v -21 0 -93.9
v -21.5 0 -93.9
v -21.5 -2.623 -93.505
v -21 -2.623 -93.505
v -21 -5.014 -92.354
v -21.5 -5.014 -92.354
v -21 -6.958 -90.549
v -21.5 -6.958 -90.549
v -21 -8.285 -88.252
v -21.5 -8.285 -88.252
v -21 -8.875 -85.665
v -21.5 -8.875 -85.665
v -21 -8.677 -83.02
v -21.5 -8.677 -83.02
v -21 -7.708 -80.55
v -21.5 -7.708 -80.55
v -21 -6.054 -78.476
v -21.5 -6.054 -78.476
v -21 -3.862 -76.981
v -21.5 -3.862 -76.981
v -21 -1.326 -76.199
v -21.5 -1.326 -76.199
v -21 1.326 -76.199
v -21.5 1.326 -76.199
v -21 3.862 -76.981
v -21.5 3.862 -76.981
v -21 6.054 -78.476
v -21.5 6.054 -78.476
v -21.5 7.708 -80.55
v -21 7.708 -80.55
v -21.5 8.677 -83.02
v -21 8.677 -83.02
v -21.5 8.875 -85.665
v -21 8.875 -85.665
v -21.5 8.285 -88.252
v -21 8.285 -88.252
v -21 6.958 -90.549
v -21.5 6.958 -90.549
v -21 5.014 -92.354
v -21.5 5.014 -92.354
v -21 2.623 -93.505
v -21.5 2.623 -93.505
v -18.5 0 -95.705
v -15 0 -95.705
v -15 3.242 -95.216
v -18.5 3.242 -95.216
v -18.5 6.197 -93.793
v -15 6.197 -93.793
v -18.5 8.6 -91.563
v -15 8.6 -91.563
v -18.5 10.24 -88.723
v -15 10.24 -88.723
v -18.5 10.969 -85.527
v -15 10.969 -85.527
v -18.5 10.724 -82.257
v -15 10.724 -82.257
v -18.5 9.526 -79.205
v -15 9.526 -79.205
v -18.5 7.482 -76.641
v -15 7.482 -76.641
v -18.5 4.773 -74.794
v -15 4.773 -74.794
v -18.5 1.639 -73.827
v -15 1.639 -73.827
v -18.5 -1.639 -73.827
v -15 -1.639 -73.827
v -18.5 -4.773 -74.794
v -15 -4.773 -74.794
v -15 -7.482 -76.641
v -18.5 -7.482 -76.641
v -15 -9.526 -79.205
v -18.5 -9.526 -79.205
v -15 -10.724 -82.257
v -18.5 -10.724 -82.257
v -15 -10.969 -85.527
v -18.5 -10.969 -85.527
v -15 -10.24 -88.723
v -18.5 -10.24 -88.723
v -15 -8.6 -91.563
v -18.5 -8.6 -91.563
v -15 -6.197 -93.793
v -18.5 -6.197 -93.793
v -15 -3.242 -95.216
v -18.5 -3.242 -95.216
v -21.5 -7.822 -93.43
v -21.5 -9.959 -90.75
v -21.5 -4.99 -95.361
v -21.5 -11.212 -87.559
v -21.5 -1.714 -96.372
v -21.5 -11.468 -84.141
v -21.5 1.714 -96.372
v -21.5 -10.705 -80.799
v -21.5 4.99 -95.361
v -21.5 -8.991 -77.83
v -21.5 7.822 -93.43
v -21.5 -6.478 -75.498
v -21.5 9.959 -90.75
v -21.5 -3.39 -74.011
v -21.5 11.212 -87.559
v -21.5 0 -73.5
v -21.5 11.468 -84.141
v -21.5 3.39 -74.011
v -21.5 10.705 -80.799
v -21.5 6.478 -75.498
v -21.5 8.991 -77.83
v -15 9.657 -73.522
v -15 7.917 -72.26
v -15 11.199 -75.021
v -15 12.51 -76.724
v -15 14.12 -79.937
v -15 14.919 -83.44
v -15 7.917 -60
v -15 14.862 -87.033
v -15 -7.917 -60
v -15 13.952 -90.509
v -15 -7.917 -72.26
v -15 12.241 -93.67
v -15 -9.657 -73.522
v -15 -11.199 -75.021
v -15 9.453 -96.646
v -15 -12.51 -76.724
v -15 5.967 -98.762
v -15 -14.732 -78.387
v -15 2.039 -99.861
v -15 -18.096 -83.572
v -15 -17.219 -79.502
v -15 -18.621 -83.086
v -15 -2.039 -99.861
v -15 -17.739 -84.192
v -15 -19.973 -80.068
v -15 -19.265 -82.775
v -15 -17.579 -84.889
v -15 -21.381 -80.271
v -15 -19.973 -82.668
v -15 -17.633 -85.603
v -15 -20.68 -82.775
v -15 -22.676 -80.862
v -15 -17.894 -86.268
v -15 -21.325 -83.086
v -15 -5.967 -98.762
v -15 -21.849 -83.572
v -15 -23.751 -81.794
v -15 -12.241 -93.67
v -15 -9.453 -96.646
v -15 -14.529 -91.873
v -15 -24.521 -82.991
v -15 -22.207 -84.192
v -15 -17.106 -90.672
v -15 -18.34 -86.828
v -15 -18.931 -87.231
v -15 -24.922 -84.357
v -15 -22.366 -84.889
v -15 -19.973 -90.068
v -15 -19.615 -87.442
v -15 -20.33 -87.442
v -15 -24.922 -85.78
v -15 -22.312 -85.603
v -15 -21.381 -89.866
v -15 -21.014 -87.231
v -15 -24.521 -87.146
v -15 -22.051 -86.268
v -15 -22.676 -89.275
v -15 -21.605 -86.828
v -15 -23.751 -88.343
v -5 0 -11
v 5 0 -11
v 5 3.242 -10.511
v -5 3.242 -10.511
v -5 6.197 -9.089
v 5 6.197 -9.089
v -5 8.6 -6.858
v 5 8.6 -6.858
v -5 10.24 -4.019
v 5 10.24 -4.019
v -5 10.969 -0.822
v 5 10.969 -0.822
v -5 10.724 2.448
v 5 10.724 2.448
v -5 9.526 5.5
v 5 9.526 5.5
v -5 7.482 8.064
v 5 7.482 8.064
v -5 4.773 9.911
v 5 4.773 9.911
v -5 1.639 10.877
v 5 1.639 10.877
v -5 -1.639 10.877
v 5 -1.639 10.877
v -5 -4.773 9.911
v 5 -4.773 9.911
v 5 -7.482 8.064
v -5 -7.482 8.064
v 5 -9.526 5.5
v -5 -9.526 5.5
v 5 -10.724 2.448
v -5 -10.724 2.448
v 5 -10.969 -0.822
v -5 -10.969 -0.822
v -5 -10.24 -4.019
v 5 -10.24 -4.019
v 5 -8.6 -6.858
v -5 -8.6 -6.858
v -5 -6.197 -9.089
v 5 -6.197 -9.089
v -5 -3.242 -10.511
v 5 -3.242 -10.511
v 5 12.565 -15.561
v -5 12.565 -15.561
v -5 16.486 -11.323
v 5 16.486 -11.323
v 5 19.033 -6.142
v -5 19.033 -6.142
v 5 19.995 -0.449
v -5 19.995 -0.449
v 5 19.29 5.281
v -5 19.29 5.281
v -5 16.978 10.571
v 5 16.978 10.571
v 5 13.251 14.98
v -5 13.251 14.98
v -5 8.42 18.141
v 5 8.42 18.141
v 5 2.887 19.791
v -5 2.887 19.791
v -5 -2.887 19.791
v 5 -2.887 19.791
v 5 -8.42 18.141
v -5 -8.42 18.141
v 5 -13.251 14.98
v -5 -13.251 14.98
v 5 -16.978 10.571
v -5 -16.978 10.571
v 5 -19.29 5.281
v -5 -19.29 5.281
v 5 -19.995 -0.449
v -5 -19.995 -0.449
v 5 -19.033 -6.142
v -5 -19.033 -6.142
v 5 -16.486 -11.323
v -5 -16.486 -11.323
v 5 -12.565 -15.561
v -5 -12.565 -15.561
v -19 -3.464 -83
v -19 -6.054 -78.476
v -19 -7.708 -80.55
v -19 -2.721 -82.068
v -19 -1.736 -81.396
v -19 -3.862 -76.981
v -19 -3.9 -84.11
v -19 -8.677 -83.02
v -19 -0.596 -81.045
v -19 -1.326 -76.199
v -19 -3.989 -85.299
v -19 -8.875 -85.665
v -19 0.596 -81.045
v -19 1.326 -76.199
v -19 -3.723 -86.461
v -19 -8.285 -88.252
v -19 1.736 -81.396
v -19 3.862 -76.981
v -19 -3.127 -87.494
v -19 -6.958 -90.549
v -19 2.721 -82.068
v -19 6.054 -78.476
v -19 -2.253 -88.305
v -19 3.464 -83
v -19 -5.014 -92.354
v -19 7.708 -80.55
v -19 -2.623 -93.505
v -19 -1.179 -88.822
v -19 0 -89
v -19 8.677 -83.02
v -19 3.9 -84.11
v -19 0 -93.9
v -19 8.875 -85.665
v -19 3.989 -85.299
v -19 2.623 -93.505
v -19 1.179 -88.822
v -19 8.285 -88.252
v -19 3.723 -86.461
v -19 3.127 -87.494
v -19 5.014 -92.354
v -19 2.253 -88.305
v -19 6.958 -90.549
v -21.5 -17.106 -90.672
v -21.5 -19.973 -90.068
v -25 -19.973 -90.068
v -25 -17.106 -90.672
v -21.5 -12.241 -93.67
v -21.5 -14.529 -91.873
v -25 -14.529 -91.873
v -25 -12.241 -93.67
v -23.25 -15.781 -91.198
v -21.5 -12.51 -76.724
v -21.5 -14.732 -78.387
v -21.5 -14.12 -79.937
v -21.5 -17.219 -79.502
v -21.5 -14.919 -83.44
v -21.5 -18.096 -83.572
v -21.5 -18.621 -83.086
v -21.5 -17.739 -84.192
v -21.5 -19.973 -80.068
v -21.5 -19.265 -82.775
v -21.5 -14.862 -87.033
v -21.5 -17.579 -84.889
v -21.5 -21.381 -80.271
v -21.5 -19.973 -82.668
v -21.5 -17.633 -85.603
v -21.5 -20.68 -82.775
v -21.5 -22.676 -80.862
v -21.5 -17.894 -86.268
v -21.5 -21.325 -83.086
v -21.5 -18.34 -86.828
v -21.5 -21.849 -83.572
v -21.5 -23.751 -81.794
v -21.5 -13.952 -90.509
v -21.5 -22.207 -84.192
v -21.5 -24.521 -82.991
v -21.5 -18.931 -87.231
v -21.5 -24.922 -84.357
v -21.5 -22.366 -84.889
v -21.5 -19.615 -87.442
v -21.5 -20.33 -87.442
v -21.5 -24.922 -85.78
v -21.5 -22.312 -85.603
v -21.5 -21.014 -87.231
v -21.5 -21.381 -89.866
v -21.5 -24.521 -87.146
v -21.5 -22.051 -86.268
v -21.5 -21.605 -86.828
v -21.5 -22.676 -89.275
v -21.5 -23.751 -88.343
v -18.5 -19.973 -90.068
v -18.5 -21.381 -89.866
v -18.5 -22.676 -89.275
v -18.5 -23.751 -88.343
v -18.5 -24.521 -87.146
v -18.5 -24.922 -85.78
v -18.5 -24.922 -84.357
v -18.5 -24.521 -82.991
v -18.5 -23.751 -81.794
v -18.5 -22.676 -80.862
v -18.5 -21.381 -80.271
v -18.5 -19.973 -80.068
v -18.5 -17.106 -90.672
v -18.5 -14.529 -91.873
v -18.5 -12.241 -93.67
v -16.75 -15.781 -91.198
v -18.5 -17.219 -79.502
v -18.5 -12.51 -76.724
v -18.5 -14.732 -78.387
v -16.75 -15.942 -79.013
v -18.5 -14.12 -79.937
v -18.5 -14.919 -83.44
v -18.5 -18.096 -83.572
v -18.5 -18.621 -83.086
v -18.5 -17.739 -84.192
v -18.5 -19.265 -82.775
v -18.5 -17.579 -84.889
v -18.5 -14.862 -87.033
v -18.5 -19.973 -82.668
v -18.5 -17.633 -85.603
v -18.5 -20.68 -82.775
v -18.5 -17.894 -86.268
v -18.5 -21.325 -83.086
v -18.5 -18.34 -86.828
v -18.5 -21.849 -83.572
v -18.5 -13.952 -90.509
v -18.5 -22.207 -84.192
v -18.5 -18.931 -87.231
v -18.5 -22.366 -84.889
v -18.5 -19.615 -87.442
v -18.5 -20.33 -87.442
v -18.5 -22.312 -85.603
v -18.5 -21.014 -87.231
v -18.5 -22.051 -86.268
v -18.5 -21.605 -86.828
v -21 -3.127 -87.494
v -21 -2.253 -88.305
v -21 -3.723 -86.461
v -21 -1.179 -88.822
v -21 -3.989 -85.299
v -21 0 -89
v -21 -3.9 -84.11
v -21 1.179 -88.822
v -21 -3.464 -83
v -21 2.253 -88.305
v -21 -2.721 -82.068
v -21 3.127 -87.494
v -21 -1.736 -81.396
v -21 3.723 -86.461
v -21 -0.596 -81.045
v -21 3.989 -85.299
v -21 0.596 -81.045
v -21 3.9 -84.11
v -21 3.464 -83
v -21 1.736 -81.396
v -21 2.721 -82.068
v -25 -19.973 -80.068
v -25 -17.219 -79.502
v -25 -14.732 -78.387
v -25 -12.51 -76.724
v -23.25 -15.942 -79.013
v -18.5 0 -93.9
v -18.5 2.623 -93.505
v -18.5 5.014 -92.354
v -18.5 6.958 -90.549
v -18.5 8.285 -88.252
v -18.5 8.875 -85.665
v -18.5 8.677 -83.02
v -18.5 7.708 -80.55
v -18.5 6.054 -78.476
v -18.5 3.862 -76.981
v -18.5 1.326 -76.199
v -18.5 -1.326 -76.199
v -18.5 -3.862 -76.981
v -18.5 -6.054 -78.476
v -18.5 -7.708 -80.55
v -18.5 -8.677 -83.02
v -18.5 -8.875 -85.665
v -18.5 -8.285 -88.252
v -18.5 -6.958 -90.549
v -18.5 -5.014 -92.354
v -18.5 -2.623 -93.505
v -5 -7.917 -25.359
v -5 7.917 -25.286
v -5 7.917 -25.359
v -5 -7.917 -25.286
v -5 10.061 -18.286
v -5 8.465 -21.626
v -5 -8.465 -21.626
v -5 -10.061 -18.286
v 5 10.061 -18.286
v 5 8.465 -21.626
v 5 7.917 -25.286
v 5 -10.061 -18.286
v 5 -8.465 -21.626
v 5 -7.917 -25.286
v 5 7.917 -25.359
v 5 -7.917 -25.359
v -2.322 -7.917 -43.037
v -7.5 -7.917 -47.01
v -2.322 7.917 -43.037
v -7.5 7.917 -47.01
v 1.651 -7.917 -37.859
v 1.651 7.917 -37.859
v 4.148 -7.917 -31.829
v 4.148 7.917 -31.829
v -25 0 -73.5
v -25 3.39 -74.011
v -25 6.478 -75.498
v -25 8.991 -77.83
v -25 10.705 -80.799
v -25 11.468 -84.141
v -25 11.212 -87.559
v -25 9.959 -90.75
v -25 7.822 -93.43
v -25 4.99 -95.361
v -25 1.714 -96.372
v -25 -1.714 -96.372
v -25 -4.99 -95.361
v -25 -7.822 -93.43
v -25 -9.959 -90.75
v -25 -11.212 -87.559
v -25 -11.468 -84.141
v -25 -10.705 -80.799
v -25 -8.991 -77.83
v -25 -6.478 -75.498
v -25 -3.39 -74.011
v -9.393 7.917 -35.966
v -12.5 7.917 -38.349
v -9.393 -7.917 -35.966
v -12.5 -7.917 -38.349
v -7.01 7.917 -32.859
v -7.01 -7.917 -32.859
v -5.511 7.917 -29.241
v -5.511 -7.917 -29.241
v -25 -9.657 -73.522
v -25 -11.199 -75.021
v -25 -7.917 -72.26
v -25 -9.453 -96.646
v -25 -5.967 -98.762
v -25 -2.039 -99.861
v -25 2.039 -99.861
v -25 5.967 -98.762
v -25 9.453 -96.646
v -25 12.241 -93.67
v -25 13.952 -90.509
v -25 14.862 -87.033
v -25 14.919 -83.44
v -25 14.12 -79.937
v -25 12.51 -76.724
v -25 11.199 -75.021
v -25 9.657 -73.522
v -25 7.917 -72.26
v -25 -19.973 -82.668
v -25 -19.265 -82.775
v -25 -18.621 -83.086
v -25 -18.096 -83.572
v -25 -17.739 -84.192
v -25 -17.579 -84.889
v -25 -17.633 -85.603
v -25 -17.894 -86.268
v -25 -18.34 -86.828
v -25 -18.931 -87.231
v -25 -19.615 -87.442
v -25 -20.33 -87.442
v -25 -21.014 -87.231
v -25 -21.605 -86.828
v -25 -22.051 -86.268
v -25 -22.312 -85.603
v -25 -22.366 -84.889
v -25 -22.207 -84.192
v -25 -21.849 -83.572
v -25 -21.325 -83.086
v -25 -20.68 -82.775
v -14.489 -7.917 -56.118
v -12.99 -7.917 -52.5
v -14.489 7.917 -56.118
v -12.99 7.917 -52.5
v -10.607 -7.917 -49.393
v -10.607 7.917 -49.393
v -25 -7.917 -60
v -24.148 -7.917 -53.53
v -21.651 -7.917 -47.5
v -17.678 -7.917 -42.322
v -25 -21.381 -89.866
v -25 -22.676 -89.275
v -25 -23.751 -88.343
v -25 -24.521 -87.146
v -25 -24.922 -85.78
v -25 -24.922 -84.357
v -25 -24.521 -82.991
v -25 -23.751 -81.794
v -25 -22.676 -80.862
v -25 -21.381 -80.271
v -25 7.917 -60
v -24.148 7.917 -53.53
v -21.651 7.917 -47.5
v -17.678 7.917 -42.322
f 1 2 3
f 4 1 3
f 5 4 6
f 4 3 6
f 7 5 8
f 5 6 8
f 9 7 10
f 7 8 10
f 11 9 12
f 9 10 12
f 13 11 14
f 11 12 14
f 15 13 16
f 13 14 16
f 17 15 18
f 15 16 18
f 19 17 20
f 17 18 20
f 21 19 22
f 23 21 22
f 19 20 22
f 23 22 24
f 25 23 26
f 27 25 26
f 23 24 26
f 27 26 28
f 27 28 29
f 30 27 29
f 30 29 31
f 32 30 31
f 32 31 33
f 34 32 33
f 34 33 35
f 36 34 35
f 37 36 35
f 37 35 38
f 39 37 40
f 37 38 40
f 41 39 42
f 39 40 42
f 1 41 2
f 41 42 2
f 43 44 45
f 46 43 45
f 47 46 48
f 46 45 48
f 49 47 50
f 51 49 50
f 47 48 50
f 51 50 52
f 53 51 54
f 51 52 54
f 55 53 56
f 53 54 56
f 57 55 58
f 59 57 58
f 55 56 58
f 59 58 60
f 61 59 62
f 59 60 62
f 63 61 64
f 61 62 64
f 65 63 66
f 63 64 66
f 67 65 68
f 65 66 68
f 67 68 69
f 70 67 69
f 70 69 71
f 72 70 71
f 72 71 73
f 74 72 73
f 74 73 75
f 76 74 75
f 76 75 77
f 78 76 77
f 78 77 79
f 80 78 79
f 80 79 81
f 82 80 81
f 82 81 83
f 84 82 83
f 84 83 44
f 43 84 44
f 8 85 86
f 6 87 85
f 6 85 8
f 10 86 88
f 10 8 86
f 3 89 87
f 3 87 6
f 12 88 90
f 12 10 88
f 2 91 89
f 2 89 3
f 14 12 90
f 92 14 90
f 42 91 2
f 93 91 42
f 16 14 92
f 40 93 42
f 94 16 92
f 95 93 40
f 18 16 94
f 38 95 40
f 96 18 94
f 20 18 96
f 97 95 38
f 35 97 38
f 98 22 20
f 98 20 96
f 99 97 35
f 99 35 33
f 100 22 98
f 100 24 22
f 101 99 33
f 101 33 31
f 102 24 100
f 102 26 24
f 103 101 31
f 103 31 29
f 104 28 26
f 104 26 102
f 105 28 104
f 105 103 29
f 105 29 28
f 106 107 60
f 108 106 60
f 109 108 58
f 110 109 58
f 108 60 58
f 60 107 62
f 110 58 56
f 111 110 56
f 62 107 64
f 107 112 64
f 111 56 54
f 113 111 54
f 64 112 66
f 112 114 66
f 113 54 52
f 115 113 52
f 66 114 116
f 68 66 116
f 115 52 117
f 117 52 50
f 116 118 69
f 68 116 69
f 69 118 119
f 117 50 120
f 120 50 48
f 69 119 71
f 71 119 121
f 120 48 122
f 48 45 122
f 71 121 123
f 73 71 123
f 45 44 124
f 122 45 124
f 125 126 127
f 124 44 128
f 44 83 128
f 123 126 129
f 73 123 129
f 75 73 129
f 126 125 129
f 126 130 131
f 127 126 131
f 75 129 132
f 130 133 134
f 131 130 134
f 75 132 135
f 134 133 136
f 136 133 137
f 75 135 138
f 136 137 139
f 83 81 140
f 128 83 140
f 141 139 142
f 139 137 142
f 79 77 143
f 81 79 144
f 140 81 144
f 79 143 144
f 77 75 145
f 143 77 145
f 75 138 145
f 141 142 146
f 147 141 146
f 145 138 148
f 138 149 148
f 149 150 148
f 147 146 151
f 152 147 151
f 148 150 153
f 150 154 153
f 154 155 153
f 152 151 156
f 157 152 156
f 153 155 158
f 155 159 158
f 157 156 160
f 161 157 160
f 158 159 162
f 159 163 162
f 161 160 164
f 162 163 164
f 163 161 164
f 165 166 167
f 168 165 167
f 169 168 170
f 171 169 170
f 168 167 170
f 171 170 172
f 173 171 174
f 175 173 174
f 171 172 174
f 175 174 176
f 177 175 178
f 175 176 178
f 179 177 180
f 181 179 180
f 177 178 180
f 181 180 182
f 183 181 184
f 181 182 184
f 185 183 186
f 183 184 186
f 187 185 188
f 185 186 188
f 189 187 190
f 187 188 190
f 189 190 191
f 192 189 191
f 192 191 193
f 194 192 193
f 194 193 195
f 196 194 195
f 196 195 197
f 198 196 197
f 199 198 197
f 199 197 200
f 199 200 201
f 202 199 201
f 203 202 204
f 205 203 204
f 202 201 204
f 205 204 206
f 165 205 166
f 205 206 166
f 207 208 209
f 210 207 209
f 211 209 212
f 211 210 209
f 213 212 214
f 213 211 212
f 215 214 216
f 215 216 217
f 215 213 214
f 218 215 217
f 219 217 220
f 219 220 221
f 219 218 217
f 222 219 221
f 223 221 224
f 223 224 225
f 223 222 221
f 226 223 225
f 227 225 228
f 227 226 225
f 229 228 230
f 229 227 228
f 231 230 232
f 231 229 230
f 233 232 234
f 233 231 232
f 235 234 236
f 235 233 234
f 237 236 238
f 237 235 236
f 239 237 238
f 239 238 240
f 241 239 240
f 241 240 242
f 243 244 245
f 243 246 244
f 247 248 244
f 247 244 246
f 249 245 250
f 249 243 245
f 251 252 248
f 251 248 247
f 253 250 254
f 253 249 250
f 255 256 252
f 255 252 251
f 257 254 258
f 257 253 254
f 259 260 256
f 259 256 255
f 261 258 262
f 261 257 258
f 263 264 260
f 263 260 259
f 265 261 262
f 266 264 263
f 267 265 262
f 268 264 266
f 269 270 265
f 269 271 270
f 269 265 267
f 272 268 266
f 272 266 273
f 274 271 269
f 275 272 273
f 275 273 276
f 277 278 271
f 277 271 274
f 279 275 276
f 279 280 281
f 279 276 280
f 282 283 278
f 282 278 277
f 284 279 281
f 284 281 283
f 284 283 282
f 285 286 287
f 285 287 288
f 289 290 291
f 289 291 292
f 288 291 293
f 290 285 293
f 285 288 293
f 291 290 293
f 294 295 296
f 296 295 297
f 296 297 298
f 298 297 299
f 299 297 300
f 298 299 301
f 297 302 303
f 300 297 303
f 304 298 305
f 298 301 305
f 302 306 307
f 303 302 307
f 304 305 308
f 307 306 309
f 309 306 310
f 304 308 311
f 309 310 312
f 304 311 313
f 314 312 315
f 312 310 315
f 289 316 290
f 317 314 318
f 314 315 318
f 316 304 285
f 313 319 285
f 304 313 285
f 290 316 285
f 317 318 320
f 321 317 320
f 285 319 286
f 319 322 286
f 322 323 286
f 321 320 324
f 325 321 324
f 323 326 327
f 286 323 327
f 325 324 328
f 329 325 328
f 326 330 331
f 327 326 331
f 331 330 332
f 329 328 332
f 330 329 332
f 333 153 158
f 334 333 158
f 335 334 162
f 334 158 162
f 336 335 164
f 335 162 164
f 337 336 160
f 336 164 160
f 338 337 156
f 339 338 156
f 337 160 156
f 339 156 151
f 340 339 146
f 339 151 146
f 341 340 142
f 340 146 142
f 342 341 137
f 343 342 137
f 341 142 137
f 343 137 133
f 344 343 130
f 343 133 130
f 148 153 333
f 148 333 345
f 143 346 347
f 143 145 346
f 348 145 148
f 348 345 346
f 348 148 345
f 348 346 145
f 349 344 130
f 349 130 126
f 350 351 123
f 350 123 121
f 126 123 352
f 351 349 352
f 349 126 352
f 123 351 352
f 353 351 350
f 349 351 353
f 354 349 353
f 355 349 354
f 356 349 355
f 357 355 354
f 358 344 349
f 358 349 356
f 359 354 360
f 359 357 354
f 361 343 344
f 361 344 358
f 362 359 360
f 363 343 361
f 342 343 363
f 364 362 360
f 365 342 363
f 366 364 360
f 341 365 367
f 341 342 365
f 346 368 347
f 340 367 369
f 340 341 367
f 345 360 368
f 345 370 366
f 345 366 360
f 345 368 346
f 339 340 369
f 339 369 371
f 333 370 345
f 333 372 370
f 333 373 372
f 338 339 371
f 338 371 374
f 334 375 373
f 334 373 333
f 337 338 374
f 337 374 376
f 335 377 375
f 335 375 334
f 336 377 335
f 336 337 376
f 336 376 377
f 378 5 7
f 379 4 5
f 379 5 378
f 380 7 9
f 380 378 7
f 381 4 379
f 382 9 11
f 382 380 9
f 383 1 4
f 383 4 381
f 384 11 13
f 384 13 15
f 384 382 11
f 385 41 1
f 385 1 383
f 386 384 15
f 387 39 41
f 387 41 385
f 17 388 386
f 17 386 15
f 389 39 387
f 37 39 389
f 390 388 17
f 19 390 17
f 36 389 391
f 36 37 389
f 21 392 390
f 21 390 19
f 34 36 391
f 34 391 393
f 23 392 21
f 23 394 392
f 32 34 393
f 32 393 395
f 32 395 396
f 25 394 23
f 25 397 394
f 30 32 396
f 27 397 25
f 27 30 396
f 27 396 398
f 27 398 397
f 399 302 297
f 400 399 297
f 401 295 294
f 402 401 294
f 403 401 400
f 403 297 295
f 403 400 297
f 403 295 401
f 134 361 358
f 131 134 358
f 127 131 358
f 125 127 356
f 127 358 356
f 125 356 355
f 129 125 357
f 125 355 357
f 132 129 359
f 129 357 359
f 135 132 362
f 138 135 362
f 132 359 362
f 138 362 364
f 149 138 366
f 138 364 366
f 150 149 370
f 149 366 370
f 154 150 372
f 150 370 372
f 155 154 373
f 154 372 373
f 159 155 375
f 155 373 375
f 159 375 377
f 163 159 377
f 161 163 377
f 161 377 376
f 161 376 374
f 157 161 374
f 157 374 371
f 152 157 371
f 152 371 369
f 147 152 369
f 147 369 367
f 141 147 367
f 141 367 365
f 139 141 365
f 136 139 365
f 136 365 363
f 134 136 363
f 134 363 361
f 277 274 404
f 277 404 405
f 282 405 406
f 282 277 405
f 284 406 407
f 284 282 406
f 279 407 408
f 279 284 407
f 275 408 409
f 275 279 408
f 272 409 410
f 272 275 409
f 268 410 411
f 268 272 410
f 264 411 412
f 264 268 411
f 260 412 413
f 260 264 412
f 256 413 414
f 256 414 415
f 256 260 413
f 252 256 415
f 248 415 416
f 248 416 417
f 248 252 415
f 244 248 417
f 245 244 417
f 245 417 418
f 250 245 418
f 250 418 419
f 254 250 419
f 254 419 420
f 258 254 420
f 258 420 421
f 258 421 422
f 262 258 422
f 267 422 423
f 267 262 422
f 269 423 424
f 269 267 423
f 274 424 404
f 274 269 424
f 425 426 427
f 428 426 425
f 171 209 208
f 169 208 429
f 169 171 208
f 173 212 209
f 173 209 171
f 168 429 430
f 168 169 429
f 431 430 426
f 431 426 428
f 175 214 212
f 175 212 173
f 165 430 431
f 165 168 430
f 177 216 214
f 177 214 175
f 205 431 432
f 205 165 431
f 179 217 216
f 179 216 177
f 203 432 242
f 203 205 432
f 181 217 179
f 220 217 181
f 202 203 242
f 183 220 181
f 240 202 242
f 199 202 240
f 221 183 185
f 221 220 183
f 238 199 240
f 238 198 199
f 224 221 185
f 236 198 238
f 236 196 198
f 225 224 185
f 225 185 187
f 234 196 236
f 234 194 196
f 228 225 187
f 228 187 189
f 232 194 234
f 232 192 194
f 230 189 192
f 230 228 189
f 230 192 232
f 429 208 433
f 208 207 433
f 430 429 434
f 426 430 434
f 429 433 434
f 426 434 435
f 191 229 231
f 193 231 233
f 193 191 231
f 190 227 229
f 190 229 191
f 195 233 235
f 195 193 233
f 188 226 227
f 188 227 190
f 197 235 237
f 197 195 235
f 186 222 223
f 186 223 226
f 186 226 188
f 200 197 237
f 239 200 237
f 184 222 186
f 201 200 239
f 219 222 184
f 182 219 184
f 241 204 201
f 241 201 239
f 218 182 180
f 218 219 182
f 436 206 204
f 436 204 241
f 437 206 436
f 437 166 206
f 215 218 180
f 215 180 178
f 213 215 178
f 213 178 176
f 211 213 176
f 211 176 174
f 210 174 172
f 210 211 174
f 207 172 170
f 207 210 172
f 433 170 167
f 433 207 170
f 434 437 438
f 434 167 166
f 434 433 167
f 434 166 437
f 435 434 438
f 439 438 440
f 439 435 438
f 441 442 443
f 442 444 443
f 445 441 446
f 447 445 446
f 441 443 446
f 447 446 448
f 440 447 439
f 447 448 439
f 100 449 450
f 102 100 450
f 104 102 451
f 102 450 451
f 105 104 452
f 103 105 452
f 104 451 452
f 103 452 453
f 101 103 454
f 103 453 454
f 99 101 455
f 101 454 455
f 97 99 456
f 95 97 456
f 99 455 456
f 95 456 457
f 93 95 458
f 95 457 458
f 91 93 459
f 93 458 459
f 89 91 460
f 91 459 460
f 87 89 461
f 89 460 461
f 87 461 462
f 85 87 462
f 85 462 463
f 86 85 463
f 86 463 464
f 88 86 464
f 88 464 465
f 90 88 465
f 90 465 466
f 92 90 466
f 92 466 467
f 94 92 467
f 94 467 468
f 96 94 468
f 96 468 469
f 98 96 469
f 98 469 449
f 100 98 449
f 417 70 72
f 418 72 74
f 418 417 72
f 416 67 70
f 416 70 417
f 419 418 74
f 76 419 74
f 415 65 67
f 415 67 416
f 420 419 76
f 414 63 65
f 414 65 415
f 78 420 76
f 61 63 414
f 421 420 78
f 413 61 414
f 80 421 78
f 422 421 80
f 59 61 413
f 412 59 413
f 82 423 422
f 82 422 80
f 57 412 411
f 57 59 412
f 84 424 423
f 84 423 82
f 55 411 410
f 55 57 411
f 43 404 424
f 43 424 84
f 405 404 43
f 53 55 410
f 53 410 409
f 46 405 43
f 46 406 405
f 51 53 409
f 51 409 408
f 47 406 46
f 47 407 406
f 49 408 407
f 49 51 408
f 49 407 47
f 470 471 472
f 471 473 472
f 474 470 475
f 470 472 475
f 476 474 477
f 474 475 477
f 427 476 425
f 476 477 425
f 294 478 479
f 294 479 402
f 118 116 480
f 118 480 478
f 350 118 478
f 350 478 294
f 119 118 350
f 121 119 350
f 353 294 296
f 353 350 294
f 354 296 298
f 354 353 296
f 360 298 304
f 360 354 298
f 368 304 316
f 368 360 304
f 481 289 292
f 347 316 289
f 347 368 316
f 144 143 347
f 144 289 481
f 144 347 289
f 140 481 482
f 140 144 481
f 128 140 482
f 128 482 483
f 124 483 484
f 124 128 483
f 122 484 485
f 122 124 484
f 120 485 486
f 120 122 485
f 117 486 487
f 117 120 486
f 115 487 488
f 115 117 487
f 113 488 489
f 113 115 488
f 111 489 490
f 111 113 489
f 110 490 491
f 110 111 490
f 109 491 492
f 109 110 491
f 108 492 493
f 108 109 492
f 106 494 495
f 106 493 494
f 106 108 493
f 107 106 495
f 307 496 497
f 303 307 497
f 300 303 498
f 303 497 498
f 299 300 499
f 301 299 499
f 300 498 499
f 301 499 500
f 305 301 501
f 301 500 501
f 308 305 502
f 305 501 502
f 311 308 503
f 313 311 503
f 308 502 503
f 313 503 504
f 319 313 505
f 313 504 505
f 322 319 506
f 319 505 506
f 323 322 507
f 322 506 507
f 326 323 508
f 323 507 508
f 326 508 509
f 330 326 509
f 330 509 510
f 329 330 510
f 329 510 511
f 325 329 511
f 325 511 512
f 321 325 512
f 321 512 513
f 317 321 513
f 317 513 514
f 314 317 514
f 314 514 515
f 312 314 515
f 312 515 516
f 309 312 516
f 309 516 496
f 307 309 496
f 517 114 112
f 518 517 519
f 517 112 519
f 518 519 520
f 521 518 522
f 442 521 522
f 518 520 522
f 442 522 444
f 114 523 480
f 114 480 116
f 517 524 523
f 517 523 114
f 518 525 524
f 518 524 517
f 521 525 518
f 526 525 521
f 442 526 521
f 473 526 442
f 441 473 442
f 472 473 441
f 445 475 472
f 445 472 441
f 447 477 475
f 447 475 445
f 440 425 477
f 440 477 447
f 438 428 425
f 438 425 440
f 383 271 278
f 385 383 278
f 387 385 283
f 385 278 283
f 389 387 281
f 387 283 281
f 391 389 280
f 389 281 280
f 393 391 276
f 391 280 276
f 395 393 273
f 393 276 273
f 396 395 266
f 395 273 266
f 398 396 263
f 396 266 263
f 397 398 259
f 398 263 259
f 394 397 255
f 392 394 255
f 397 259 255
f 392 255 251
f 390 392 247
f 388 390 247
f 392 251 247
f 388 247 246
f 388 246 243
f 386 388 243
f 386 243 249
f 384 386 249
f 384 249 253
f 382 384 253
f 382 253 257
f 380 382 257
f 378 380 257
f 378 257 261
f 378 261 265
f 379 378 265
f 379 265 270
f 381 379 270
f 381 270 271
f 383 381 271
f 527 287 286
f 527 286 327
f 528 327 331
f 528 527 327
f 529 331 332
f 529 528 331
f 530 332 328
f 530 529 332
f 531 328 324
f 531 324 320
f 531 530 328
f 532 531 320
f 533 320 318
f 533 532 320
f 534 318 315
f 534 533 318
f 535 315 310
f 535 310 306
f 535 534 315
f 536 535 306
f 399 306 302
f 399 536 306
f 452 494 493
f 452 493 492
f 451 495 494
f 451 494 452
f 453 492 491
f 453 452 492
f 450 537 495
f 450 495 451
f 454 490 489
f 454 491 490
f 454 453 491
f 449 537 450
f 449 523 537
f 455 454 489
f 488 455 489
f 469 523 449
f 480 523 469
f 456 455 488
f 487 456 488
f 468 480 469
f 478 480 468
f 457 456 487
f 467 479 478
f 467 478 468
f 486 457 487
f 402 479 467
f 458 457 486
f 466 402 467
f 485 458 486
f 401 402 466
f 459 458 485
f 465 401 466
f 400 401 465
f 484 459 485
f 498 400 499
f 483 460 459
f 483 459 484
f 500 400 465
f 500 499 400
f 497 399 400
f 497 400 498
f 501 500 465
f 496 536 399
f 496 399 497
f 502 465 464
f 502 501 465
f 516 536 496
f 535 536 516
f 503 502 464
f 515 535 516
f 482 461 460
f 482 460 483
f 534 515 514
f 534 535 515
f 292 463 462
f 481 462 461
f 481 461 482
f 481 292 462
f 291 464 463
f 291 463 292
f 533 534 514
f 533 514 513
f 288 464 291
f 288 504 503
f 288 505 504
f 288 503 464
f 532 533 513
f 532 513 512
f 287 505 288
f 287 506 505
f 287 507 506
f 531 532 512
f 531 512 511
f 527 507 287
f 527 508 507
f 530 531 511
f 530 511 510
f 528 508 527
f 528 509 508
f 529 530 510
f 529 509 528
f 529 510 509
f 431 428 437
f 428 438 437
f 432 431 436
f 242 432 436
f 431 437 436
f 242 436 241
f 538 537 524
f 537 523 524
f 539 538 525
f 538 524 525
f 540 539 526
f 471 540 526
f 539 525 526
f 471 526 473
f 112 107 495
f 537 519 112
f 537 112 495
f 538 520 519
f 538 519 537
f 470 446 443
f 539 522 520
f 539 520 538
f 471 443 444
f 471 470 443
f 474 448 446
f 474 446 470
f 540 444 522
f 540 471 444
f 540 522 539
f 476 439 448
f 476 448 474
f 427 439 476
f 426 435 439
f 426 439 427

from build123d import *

# Parameters (mm, degrees)
CROQUIS2_W              = 10
CROQUIS2_H              = 15.834903248
CROQUIS4_R              = 15
SALIENTE_EXTRUIR1_DEPTH = 10
CROQUIS5_R              = 20
SALIENTE_EXTRUIR2_DEPTH = 10
SALIENTE_EXTRUIR5_DEPTH = 3.5
CROQUIS13_R             = 2.5
CORTAR_EXTRUIR1_DEPTH   = 10
SIMETR_A3_COPY_1_DEPTH  = 3.5
CORTAR_EXTRUIR5_DEPTH   = 10
CROQUIS21_R             = 2.4
CORTAR_EXTRUIR6_DEPTH   = 10
CROQUIS7_R              = 11
CORTAR_EXTRUIR7_DEPTH   = 10
REDONDEO1_R             = 12.5
REDONDEO2_R             = 12.5
CROQUIS22_R             = 11.5
CORTAR_EXTRUIR8_DEPTH   = 4
CROQUIS6_R              = 4
CORTAR_EXTRUIR9_DEPTH   = 8
CROQUIS23_R             = 11
CORTAR_EXTRUIR10_DEPTH  = 4
CROQUIS24_R             = 11.295388062
CROQUIS24_R_2           = 8.9
SALIENTE_EXTRUIR6_DEPTH = 0.5
SALIENTE_EXTRUIR7_START = 0.5
CROQUIS25_R             = 11.5
CROQUIS25_R_2           = 8.9
SALIENTE_EXTRUIR7_DEPTH = 0.5


with BuildPart() as part:
    # Barrer1: sweep along a path in Croquis1
    with BuildLine(Plane(origin=(0, 0, 0), x_dir=(1, 0, 0), z_dir=(0, 1, 0))) as barrer1_path:
        Line((-20, 85), (-20, 60))
        ThreePointArc((-20, 60), (-17.320508076, 50), (-10, 42.679491924))
        ThreePointArc((-10, 42.679491924), (-2.679491924, 35.358983849), (0, 25.358983849))
        Line((0, 25.358983849), (0, 0))
    # Croquis2 → Barrer1 (sweep)
    with BuildSketch(Plane.XY):
        Rectangle(CROQUIS2_W, CROQUIS2_H)
    sweep(path=barrer1_path.line)

    # Croquis4 → Saliente-Extruir1 (add)
    with BuildSketch(Plane(origin=(-15, 0, 0), x_dir=(0, 0, -1), z_dir=(1, 0, 0))):
        with Locations((85, 0)):
            Circle(CROQUIS4_R)
    extrude(amount=-SALIENTE_EXTRUIR1_DEPTH)

    # Croquis5 → Saliente-Extruir2 (add)
    with BuildSketch(Plane(origin=(5, 0, 0), x_dir=(0, 0, -1), z_dir=(1, 0, 0))):
        Circle(CROQUIS5_R)
    extrude(amount=-SALIENTE_EXTRUIR2_DEPTH)

    # Croquis12 → Saliente-Extruir5 (add)
    with BuildSketch(Plane(origin=(-15, 0, 0), x_dir=(0, 0, -1), z_dir=(1, 0, 0))):
        with BuildLine():
            ThreePointArc((90.068496439, 19.972615481), (85.068496439, 24.972615481), (80.068496439, 19.972615481))
            add(Edge.make_bspline(
                [(80.068496439, 19.972615481), (79.566731031, 15.028252388), (75.848465439, 11.643922813)],
                knots=[0, 0, 0, 1, 1, 1], degree=2))
            ThreePointArc((75.848465439, 11.643922813), (85.068496439, 14.846363713), (94.288527439, 11.643922813))
            add(Edge.make_bspline(
                [(90.068496439, 19.972615481), (90.570261847, 15.028252388), (94.288527439, 11.643922813)],
                knots=[0, 0, 0, 1, 1, 1], degree=2))
        make_face()
    saliente_extruir5 = extrude(amount=-SALIENTE_EXTRUIR5_DEPTH)

    # Simetría1: Saliente-Extruir5 across plane
    add(saliente_extruir5.mirror(Plane(origin=(-20, 0, 0), x_dir=(0, 0, 1), z_dir=(1, 0, 0))))

    # Croquis13 → Cortar-Extruir1 (cut)
    with BuildSketch(Plane(origin=(-15, 0, 0), x_dir=(0, 0, -1), z_dir=(1, 0, 0))):
        with Locations((85.068496439, 19.972615481)):
            Circle(CROQUIS13_R)
    extrude(amount=-CORTAR_EXTRUIR1_DEPTH, mode=Mode.SUBTRACT)

    # Simetría3: Saliente-Extruir5 across plane
    add(saliente_extruir5.mirror(Plane.ZX))

    # Simetría3 copy 1 sketch → Simetría3 copy 1 (add)
    with BuildSketch(Plane(origin=(-25, 0, 0), x_dir=(0, 0, -1), z_dir=(-1, 0, 0))):
        with BuildLine():
            ThreePointArc((90.068496439, 19.972615481), (85.068496439, 24.972615481), (80.068496439, 19.972615481))
            add(Edge.make_bspline(
                [(80.068496439, 19.972615481), (79.566731031, 15.028252388), (75.848465439, 11.643922813)],
                knots=[0, 0, 0, 1, 1, 1], degree=2))
            ThreePointArc((75.848465439, 11.643922813), (85.068496439, 14.846363713), (94.288527439, 11.643922813))
            add(Edge.make_bspline(
                [(90.068496439, 19.972615481), (90.570261847, 15.028252388), (94.288527439, 11.643922813)],
                knots=[0, 0, 0, 1, 1, 1], degree=2))
        make_face()
    extrude(amount=-SIMETR_A3_COPY_1_DEPTH)

    # Croquis20 → Cortar-Extruir5 (cut)
    with BuildSketch(Plane(origin=(-15, 0, 0), x_dir=(0, 0, -1), z_dir=(1, 0, 0))):
        with BuildLine():
            Line((75.916830569, 25.735778906), (95.172377376, 25.735778906))
            Line((95.172377376, 25.735778906), (95.172377376, 11.023735234))
            ThreePointArc((95.172377376, 11.023735234), (85.710763224, 14.983151058), (75.916830569, 11.93717023))
            Line((75.916830569, 11.93717023), (75.916830569, 25.735778906))
        make_face()
    extrude(amount=-CORTAR_EXTRUIR5_DEPTH, mode=Mode.SUBTRACT)

    # Croquis21 → Cortar-Extruir6 (cut)
    with BuildSketch(Plane.ZY.offset(25)):
        with Locations((-85.068496439, -19.972615481)):
            Circle(CROQUIS21_R)
    extrude(amount=-CORTAR_EXTRUIR6_DEPTH, mode=Mode.SUBTRACT)

    # Croquis7 → Cortar-Extruir7 (cut)
    with BuildSketch(Plane(origin=(5, 0, 0), x_dir=(0, 0, -1), z_dir=(1, 0, 0))):
        Circle(CROQUIS7_R)
    extrude(amount=-CORTAR_EXTRUIR7_DEPTH, mode=Mode.SUBTRACT)

    # Redondeo1
    redondeo1_edges = [part.edges().sort_by_distance(p)[0] for p in [
        (0, -7.917451624, -18.366108999),
    ]]
    fillet(redondeo1_edges, radius=REDONDEO1_R)

    # Redondeo2
    redondeo2_edges = [part.edges().sort_by_distance(p)[0] for p in [
        (0, 7.917451624, -18.366108999),
    ]]
    fillet(redondeo2_edges, radius=REDONDEO2_R)

    # Croquis22 → Cortar-Extruir8 (cut)
    with BuildSketch(Plane.ZY.offset(25)):
        with Locations((-85, 0)):
            Circle(CROQUIS22_R)
    extrude(amount=-CORTAR_EXTRUIR8_DEPTH, mode=Mode.SUBTRACT)

    # Croquis6 → Cortar-Extruir9 (cut)
    with BuildSketch(Plane(origin=(-15, 0, 0), x_dir=(0, 0, -1), z_dir=(1, 0, 0))):
        with Locations((85, 0)):
            Circle(CROQUIS6_R)
    extrude(amount=-CORTAR_EXTRUIR9_DEPTH, mode=Mode.SUBTRACT)

    # Croquis23 → Cortar-Extruir10 (cut)
    with BuildSketch(Plane(origin=(-15, 0, 0), x_dir=(0, 0, -1), z_dir=(1, 0, 0))):
        with Locations((84.704611938, 0)):
            Circle(CROQUIS23_R)
    extrude(amount=-CORTAR_EXTRUIR10_DEPTH, mode=Mode.SUBTRACT)

    # Croquis24 → Saliente-Extruir6 (add)
    with BuildSketch(Plane(origin=(-19, 0, 0), x_dir=(0, 0, -1), z_dir=(1, 0, 0))):
        with Locations((85, 0)):
            Circle(CROQUIS24_R)
        with Locations((85, 0)):
            Circle(CROQUIS24_R_2, mode=Mode.SUBTRACT)
    extrude(amount=SALIENTE_EXTRUIR6_DEPTH)

    # Croquis25 → Saliente-Extruir7 (add)
    with BuildSketch(Plane.ZY.offset(21).offset(SALIENTE_EXTRUIR7_START)):
        with Locations((-85, 0)):
            Circle(CROQUIS25_R)
        with Locations(Location((-85, 0, 0), (0, 0, 180))):
            Circle(CROQUIS25_R_2, mode=Mode.SUBTRACT)
    extrude(amount=-SALIENTE_EXTRUIR7_DEPTH)


solid = part.part
